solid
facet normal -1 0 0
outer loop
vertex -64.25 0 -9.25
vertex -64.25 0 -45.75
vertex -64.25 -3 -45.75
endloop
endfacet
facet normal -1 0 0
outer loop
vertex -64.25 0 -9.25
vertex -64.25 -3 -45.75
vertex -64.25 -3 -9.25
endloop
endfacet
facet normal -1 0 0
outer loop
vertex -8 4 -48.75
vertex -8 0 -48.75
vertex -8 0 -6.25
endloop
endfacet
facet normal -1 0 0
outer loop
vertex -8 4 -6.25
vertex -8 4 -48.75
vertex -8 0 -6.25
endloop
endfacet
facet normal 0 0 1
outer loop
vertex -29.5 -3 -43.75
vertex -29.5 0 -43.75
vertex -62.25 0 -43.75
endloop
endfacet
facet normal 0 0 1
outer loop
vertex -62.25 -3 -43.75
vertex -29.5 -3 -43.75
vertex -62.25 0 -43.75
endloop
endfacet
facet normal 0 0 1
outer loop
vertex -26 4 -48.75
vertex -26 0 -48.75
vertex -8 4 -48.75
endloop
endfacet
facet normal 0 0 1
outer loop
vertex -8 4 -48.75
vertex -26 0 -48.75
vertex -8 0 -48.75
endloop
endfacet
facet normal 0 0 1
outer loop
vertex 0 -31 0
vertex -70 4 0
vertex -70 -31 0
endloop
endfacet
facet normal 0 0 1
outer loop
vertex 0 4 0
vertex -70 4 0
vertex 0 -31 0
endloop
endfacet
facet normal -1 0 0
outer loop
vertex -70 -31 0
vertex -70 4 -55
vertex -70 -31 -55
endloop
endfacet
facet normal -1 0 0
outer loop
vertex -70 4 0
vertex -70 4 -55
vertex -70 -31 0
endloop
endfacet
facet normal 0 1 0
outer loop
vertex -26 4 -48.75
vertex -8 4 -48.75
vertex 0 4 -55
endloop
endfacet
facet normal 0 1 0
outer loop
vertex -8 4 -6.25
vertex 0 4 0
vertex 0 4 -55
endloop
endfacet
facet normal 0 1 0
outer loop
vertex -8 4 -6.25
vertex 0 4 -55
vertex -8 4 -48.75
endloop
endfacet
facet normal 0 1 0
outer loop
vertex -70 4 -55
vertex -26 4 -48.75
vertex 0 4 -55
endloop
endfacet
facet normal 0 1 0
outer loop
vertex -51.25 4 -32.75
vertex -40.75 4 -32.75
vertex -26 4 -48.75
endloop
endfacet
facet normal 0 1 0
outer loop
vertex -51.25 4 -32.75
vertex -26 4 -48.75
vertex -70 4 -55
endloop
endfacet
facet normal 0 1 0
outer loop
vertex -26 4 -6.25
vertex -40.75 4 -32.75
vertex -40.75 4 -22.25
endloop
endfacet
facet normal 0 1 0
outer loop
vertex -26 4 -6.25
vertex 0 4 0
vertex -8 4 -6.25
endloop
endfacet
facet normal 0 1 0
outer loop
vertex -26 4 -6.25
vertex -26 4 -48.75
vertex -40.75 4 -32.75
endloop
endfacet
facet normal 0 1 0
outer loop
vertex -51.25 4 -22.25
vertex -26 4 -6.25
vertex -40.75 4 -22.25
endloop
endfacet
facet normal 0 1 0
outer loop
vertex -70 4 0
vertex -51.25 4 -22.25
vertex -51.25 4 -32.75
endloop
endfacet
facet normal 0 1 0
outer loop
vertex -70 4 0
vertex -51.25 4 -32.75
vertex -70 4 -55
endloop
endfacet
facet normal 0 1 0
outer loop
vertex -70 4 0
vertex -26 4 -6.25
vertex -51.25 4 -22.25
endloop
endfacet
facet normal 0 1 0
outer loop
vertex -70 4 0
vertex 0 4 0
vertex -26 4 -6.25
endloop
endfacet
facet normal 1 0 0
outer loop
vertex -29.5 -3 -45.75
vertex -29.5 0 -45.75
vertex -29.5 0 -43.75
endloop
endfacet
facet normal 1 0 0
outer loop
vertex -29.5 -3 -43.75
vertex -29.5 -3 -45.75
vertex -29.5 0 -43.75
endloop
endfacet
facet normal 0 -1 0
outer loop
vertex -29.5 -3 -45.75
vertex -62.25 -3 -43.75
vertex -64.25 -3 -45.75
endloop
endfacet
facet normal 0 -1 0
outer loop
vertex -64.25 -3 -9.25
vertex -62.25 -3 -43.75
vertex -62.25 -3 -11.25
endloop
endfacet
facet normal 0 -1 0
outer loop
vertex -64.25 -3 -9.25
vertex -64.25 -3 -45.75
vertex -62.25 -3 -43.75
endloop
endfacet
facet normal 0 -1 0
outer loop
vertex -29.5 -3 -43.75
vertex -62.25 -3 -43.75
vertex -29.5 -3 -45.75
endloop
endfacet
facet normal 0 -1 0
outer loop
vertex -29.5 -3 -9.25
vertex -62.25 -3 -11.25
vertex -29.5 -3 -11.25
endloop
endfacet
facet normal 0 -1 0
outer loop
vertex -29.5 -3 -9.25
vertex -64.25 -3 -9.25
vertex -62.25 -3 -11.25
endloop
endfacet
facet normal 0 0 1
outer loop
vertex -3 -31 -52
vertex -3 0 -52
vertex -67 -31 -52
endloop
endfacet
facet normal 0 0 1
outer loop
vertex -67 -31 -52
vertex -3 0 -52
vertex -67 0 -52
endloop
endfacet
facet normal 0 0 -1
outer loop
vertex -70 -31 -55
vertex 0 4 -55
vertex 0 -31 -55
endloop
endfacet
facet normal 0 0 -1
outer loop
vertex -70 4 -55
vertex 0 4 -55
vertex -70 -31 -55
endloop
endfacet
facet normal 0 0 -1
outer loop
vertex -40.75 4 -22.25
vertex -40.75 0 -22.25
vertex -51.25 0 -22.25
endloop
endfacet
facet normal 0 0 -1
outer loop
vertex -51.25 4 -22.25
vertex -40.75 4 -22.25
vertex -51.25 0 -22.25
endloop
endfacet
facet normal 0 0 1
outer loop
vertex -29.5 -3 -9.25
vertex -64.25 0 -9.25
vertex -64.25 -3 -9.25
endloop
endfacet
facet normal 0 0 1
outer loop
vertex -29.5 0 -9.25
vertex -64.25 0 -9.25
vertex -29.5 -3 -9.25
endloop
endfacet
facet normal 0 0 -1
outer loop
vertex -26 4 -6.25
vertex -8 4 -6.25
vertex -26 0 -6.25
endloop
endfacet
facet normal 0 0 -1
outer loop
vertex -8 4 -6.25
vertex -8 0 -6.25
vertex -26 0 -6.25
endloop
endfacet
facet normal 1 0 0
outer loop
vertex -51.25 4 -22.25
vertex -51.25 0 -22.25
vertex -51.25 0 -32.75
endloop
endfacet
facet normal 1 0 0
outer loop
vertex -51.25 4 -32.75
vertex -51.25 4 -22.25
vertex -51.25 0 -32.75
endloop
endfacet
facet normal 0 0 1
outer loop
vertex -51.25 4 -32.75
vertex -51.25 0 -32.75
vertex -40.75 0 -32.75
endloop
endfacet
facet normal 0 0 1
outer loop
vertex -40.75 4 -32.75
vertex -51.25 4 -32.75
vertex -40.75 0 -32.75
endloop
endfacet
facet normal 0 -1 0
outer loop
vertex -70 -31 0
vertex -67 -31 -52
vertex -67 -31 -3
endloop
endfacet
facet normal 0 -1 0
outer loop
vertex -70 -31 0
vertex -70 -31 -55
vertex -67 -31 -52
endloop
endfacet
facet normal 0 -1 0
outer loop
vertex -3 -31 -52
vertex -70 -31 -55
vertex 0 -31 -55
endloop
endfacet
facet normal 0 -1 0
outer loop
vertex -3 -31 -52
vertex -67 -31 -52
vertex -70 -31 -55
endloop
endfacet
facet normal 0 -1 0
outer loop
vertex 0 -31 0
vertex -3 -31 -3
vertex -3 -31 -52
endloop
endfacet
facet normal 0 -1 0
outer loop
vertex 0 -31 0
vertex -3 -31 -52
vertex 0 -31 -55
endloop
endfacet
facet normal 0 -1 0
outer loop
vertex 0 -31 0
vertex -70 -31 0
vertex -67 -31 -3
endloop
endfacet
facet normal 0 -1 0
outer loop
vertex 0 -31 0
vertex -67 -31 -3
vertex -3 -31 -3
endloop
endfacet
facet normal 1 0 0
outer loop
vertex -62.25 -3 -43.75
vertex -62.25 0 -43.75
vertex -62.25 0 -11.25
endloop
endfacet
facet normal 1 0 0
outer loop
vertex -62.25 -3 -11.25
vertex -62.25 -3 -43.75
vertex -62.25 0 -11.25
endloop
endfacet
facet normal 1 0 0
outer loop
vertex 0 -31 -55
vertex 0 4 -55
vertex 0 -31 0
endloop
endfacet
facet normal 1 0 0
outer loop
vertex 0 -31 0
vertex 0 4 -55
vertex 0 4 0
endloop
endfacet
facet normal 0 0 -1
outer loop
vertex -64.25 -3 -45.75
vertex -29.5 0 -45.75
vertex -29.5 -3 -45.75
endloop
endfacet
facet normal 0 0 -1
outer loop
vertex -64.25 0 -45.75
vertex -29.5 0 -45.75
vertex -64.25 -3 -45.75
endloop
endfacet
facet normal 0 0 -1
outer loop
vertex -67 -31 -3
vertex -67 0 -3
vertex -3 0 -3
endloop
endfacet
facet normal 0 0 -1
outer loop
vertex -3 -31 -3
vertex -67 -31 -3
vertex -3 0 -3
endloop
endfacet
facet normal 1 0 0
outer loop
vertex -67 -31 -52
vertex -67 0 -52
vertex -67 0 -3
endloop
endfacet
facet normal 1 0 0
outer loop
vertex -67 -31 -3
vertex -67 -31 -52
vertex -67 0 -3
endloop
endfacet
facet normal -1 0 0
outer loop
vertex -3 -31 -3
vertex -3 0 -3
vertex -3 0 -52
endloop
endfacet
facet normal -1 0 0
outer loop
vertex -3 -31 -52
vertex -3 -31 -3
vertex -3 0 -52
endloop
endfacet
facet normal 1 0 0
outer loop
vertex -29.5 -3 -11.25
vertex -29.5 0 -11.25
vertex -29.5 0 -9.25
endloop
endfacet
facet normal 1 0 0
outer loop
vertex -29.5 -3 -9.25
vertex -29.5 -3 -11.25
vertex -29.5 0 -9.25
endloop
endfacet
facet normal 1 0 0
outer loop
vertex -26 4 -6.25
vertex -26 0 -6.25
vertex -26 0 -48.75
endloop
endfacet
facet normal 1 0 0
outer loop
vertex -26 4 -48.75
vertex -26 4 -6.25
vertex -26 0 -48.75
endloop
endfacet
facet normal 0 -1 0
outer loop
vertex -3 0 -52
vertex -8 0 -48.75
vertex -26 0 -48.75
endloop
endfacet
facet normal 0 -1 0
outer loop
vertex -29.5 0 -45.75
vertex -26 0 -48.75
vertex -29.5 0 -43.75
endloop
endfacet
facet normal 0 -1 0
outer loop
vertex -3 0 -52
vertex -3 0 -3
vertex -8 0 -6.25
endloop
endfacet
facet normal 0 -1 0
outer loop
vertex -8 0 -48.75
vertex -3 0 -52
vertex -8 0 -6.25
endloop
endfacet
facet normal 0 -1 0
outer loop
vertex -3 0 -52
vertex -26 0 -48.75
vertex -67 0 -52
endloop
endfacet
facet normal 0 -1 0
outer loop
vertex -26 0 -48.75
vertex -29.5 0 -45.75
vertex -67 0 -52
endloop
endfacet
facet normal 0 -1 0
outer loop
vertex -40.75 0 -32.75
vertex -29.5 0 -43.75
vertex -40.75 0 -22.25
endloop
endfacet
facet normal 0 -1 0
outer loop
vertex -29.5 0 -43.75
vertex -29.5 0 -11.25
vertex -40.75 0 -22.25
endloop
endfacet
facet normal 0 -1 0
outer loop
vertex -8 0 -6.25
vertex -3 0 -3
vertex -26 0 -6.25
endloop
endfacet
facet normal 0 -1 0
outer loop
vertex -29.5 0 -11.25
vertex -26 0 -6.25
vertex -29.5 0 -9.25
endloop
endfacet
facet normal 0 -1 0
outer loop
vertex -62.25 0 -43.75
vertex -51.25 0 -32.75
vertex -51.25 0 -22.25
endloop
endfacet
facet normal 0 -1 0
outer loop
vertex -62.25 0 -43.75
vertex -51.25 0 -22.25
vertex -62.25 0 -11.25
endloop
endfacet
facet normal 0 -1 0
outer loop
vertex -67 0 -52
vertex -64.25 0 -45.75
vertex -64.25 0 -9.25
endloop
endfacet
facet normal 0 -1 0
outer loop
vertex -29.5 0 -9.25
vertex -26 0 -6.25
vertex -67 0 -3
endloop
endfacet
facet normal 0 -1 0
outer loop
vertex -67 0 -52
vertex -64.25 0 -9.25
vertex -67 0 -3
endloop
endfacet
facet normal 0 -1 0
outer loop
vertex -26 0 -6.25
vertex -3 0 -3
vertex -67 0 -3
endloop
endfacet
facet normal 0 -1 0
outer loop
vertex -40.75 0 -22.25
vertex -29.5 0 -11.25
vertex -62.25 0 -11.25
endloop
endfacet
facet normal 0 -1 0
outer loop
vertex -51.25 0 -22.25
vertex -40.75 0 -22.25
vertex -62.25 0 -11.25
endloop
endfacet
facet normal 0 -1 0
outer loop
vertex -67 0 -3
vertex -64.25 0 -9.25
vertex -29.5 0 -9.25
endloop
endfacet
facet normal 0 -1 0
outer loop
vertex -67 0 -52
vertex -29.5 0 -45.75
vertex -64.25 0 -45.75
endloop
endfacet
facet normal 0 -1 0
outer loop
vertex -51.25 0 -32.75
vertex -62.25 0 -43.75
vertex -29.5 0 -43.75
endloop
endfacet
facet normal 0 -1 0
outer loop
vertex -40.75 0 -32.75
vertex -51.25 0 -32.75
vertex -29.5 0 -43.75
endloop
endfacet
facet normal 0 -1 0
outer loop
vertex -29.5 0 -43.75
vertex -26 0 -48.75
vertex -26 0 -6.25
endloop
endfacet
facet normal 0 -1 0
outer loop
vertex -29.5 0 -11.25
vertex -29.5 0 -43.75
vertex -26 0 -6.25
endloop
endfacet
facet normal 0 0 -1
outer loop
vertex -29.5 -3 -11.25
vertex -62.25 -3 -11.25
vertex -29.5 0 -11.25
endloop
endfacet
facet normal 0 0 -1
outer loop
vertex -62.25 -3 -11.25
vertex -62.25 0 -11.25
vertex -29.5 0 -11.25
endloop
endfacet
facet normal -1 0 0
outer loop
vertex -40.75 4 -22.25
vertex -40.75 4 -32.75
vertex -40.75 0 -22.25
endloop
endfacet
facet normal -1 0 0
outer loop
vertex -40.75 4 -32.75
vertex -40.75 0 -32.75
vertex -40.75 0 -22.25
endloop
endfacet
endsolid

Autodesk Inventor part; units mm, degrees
ref_plane "YZ Plane" through (0, 0, 0) normal (1, 0, 0) x (0, 1, 0)
ref_plane "XZ Plane" through (0, 0, 0) normal (0, 1, 0) x (-1, 0, 0)
ref_plane "XY Plane" through (0, 0, 0) normal (0, 0, 1) x (1, 0, 0)
sketch "Sketch1" plane through (0, 0, 0) normal (0, 1, 0) x (-1, 0, 0)
  line L0 (0, 0) -> (70, 0)
  line L1 (70, 0) -> (70, -55)
  line L2 (70, -55) -> (0, -55)
  line L3 (0, -55) -> (0, 0)
  line L4 (51.25, -32.75) -> (40.75, -32.75)
  line L5 (40.75, -32.75) -> (40.75, -22.25)
  line L6 (40.75, -22.25) -> (51.25, -22.25)
  line L7 (51.25, -22.25) -> (51.25, -32.75)
  line L8 (26, -48.75) -> (8, -48.75)
  line L9 (8, -48.75) -> (8, -6.25)
  line L10 (8, -6.25) -> (26, -6.25)
  line L11 (26, -6.25) -> (26, -48.75)
  dimension "d0" = 70
  dimension "d1" = 55
  dimension "d2" = 10.5
  dimension "d3" = 10.5
  dimension "d4" = 18
  dimension "d5" = 42.5
  dimension "d6" = 6.25
  dimension "d7" = 22.25
  dimension "d8" = 8
  dimension "d9" = 18.75
extrude "Extrusion1" add sketch "Sketch1" along normal blind 4
sketch "Sketch2" plane through (0, 0, 0) normal (0, -1, 0) x (1, 0, 0)
  line L0 (0, 0) -> (0, -55) projected
  line L1 (-70, 0) -> (0, 0) projected
  line L2 (0, -55) -> (-70, -55)
  line L3 (-70, -55) -> (-70, 0)
  line L4 (-70, 0) -> (0, 0)
  line L5 (0, 0) -> (0, -55)
  line L6 (-3, -52) -> (-67, -52)
  line L7 (-67, -52) -> (-67, -3)
  line L8 (-67, -3) -> (-3, -3)
  line L9 (-3, -3) -> (-3, -52)
  line L10 (-29.5, -43.75) -> (-62.25, -43.75)
  line L11 (-62.25, -43.75) -> (-62.25, -11.25)
  line L12 (-62.25, -11.25) -> (-29.5, -11.25)
  line L13 (-40.75, -32.75) -> (-51.25, -32.75) projected
  line L14 (-51.25, -22.25) -> (-40.75, -22.25) projected
  line L15 (-51.25, -32.75) -> (-51.25, -22.25) projected
  line L16 (-40.75, -22.25) -> (-40.75, -32.75) projected
  line L17 (-29.5, -45.75) -> (-64.25, -45.75)
  line L18 (-64.25, -45.75) -> (-64.25, -9.25)
  line L19 (-64.25, -9.25) -> (-29.5, -9.25)
  line L20 (-29.5, -45.75) -> (-29.5, -43.75)
  line L21 (-29.5, -11.25) -> (-29.5, -9.25)
  dimension "d14" = 3
  dimension "d15" = 3
  dimension "d16" = 3
  dimension "d17" = 3
  dimension "d18" = 32.75
  dimension "d19" = 11
  dimension "d20" = 11
  dimension "d21" = 11
  dimension "d23" = 2
  dimension "d24" = 2
  dimension "d25" = 2
extrude "Extrusion2" add sketch "Sketch2" along normal blind 3 contours L20 L17 L18 L19 L21 L12 L11 L10
sketch "Sketch3" plane through (0, 0, 0) normal (0, -1, 0) x (1, 0, 0)
  line L0 (0, -55) -> (0, 0) projected
  line L1 (0, -55) -> (-70, -55)
  line L2 (-70, -55) -> (-70, 0)
  line L3 (-70, 0) -> (0, 0)
  line L4 (0, 0) -> (0, -55)
  line L5 (-3, -52) -> (-67, -52)
  line L6 (-67, -52) -> (-67, -3)
  line L7 (-67, -3) -> (-3, -3)
  line L8 (-3, -3) -> (-3, -52)
  dimension "d28" = 3
  dimension "d29" = 3
  dimension "d30" = 3
  dimension "d31" = 3
extrude "Extrusion3" add sketch "Sketch3" along normal blind 31
properties part number "test_camAndultra"
